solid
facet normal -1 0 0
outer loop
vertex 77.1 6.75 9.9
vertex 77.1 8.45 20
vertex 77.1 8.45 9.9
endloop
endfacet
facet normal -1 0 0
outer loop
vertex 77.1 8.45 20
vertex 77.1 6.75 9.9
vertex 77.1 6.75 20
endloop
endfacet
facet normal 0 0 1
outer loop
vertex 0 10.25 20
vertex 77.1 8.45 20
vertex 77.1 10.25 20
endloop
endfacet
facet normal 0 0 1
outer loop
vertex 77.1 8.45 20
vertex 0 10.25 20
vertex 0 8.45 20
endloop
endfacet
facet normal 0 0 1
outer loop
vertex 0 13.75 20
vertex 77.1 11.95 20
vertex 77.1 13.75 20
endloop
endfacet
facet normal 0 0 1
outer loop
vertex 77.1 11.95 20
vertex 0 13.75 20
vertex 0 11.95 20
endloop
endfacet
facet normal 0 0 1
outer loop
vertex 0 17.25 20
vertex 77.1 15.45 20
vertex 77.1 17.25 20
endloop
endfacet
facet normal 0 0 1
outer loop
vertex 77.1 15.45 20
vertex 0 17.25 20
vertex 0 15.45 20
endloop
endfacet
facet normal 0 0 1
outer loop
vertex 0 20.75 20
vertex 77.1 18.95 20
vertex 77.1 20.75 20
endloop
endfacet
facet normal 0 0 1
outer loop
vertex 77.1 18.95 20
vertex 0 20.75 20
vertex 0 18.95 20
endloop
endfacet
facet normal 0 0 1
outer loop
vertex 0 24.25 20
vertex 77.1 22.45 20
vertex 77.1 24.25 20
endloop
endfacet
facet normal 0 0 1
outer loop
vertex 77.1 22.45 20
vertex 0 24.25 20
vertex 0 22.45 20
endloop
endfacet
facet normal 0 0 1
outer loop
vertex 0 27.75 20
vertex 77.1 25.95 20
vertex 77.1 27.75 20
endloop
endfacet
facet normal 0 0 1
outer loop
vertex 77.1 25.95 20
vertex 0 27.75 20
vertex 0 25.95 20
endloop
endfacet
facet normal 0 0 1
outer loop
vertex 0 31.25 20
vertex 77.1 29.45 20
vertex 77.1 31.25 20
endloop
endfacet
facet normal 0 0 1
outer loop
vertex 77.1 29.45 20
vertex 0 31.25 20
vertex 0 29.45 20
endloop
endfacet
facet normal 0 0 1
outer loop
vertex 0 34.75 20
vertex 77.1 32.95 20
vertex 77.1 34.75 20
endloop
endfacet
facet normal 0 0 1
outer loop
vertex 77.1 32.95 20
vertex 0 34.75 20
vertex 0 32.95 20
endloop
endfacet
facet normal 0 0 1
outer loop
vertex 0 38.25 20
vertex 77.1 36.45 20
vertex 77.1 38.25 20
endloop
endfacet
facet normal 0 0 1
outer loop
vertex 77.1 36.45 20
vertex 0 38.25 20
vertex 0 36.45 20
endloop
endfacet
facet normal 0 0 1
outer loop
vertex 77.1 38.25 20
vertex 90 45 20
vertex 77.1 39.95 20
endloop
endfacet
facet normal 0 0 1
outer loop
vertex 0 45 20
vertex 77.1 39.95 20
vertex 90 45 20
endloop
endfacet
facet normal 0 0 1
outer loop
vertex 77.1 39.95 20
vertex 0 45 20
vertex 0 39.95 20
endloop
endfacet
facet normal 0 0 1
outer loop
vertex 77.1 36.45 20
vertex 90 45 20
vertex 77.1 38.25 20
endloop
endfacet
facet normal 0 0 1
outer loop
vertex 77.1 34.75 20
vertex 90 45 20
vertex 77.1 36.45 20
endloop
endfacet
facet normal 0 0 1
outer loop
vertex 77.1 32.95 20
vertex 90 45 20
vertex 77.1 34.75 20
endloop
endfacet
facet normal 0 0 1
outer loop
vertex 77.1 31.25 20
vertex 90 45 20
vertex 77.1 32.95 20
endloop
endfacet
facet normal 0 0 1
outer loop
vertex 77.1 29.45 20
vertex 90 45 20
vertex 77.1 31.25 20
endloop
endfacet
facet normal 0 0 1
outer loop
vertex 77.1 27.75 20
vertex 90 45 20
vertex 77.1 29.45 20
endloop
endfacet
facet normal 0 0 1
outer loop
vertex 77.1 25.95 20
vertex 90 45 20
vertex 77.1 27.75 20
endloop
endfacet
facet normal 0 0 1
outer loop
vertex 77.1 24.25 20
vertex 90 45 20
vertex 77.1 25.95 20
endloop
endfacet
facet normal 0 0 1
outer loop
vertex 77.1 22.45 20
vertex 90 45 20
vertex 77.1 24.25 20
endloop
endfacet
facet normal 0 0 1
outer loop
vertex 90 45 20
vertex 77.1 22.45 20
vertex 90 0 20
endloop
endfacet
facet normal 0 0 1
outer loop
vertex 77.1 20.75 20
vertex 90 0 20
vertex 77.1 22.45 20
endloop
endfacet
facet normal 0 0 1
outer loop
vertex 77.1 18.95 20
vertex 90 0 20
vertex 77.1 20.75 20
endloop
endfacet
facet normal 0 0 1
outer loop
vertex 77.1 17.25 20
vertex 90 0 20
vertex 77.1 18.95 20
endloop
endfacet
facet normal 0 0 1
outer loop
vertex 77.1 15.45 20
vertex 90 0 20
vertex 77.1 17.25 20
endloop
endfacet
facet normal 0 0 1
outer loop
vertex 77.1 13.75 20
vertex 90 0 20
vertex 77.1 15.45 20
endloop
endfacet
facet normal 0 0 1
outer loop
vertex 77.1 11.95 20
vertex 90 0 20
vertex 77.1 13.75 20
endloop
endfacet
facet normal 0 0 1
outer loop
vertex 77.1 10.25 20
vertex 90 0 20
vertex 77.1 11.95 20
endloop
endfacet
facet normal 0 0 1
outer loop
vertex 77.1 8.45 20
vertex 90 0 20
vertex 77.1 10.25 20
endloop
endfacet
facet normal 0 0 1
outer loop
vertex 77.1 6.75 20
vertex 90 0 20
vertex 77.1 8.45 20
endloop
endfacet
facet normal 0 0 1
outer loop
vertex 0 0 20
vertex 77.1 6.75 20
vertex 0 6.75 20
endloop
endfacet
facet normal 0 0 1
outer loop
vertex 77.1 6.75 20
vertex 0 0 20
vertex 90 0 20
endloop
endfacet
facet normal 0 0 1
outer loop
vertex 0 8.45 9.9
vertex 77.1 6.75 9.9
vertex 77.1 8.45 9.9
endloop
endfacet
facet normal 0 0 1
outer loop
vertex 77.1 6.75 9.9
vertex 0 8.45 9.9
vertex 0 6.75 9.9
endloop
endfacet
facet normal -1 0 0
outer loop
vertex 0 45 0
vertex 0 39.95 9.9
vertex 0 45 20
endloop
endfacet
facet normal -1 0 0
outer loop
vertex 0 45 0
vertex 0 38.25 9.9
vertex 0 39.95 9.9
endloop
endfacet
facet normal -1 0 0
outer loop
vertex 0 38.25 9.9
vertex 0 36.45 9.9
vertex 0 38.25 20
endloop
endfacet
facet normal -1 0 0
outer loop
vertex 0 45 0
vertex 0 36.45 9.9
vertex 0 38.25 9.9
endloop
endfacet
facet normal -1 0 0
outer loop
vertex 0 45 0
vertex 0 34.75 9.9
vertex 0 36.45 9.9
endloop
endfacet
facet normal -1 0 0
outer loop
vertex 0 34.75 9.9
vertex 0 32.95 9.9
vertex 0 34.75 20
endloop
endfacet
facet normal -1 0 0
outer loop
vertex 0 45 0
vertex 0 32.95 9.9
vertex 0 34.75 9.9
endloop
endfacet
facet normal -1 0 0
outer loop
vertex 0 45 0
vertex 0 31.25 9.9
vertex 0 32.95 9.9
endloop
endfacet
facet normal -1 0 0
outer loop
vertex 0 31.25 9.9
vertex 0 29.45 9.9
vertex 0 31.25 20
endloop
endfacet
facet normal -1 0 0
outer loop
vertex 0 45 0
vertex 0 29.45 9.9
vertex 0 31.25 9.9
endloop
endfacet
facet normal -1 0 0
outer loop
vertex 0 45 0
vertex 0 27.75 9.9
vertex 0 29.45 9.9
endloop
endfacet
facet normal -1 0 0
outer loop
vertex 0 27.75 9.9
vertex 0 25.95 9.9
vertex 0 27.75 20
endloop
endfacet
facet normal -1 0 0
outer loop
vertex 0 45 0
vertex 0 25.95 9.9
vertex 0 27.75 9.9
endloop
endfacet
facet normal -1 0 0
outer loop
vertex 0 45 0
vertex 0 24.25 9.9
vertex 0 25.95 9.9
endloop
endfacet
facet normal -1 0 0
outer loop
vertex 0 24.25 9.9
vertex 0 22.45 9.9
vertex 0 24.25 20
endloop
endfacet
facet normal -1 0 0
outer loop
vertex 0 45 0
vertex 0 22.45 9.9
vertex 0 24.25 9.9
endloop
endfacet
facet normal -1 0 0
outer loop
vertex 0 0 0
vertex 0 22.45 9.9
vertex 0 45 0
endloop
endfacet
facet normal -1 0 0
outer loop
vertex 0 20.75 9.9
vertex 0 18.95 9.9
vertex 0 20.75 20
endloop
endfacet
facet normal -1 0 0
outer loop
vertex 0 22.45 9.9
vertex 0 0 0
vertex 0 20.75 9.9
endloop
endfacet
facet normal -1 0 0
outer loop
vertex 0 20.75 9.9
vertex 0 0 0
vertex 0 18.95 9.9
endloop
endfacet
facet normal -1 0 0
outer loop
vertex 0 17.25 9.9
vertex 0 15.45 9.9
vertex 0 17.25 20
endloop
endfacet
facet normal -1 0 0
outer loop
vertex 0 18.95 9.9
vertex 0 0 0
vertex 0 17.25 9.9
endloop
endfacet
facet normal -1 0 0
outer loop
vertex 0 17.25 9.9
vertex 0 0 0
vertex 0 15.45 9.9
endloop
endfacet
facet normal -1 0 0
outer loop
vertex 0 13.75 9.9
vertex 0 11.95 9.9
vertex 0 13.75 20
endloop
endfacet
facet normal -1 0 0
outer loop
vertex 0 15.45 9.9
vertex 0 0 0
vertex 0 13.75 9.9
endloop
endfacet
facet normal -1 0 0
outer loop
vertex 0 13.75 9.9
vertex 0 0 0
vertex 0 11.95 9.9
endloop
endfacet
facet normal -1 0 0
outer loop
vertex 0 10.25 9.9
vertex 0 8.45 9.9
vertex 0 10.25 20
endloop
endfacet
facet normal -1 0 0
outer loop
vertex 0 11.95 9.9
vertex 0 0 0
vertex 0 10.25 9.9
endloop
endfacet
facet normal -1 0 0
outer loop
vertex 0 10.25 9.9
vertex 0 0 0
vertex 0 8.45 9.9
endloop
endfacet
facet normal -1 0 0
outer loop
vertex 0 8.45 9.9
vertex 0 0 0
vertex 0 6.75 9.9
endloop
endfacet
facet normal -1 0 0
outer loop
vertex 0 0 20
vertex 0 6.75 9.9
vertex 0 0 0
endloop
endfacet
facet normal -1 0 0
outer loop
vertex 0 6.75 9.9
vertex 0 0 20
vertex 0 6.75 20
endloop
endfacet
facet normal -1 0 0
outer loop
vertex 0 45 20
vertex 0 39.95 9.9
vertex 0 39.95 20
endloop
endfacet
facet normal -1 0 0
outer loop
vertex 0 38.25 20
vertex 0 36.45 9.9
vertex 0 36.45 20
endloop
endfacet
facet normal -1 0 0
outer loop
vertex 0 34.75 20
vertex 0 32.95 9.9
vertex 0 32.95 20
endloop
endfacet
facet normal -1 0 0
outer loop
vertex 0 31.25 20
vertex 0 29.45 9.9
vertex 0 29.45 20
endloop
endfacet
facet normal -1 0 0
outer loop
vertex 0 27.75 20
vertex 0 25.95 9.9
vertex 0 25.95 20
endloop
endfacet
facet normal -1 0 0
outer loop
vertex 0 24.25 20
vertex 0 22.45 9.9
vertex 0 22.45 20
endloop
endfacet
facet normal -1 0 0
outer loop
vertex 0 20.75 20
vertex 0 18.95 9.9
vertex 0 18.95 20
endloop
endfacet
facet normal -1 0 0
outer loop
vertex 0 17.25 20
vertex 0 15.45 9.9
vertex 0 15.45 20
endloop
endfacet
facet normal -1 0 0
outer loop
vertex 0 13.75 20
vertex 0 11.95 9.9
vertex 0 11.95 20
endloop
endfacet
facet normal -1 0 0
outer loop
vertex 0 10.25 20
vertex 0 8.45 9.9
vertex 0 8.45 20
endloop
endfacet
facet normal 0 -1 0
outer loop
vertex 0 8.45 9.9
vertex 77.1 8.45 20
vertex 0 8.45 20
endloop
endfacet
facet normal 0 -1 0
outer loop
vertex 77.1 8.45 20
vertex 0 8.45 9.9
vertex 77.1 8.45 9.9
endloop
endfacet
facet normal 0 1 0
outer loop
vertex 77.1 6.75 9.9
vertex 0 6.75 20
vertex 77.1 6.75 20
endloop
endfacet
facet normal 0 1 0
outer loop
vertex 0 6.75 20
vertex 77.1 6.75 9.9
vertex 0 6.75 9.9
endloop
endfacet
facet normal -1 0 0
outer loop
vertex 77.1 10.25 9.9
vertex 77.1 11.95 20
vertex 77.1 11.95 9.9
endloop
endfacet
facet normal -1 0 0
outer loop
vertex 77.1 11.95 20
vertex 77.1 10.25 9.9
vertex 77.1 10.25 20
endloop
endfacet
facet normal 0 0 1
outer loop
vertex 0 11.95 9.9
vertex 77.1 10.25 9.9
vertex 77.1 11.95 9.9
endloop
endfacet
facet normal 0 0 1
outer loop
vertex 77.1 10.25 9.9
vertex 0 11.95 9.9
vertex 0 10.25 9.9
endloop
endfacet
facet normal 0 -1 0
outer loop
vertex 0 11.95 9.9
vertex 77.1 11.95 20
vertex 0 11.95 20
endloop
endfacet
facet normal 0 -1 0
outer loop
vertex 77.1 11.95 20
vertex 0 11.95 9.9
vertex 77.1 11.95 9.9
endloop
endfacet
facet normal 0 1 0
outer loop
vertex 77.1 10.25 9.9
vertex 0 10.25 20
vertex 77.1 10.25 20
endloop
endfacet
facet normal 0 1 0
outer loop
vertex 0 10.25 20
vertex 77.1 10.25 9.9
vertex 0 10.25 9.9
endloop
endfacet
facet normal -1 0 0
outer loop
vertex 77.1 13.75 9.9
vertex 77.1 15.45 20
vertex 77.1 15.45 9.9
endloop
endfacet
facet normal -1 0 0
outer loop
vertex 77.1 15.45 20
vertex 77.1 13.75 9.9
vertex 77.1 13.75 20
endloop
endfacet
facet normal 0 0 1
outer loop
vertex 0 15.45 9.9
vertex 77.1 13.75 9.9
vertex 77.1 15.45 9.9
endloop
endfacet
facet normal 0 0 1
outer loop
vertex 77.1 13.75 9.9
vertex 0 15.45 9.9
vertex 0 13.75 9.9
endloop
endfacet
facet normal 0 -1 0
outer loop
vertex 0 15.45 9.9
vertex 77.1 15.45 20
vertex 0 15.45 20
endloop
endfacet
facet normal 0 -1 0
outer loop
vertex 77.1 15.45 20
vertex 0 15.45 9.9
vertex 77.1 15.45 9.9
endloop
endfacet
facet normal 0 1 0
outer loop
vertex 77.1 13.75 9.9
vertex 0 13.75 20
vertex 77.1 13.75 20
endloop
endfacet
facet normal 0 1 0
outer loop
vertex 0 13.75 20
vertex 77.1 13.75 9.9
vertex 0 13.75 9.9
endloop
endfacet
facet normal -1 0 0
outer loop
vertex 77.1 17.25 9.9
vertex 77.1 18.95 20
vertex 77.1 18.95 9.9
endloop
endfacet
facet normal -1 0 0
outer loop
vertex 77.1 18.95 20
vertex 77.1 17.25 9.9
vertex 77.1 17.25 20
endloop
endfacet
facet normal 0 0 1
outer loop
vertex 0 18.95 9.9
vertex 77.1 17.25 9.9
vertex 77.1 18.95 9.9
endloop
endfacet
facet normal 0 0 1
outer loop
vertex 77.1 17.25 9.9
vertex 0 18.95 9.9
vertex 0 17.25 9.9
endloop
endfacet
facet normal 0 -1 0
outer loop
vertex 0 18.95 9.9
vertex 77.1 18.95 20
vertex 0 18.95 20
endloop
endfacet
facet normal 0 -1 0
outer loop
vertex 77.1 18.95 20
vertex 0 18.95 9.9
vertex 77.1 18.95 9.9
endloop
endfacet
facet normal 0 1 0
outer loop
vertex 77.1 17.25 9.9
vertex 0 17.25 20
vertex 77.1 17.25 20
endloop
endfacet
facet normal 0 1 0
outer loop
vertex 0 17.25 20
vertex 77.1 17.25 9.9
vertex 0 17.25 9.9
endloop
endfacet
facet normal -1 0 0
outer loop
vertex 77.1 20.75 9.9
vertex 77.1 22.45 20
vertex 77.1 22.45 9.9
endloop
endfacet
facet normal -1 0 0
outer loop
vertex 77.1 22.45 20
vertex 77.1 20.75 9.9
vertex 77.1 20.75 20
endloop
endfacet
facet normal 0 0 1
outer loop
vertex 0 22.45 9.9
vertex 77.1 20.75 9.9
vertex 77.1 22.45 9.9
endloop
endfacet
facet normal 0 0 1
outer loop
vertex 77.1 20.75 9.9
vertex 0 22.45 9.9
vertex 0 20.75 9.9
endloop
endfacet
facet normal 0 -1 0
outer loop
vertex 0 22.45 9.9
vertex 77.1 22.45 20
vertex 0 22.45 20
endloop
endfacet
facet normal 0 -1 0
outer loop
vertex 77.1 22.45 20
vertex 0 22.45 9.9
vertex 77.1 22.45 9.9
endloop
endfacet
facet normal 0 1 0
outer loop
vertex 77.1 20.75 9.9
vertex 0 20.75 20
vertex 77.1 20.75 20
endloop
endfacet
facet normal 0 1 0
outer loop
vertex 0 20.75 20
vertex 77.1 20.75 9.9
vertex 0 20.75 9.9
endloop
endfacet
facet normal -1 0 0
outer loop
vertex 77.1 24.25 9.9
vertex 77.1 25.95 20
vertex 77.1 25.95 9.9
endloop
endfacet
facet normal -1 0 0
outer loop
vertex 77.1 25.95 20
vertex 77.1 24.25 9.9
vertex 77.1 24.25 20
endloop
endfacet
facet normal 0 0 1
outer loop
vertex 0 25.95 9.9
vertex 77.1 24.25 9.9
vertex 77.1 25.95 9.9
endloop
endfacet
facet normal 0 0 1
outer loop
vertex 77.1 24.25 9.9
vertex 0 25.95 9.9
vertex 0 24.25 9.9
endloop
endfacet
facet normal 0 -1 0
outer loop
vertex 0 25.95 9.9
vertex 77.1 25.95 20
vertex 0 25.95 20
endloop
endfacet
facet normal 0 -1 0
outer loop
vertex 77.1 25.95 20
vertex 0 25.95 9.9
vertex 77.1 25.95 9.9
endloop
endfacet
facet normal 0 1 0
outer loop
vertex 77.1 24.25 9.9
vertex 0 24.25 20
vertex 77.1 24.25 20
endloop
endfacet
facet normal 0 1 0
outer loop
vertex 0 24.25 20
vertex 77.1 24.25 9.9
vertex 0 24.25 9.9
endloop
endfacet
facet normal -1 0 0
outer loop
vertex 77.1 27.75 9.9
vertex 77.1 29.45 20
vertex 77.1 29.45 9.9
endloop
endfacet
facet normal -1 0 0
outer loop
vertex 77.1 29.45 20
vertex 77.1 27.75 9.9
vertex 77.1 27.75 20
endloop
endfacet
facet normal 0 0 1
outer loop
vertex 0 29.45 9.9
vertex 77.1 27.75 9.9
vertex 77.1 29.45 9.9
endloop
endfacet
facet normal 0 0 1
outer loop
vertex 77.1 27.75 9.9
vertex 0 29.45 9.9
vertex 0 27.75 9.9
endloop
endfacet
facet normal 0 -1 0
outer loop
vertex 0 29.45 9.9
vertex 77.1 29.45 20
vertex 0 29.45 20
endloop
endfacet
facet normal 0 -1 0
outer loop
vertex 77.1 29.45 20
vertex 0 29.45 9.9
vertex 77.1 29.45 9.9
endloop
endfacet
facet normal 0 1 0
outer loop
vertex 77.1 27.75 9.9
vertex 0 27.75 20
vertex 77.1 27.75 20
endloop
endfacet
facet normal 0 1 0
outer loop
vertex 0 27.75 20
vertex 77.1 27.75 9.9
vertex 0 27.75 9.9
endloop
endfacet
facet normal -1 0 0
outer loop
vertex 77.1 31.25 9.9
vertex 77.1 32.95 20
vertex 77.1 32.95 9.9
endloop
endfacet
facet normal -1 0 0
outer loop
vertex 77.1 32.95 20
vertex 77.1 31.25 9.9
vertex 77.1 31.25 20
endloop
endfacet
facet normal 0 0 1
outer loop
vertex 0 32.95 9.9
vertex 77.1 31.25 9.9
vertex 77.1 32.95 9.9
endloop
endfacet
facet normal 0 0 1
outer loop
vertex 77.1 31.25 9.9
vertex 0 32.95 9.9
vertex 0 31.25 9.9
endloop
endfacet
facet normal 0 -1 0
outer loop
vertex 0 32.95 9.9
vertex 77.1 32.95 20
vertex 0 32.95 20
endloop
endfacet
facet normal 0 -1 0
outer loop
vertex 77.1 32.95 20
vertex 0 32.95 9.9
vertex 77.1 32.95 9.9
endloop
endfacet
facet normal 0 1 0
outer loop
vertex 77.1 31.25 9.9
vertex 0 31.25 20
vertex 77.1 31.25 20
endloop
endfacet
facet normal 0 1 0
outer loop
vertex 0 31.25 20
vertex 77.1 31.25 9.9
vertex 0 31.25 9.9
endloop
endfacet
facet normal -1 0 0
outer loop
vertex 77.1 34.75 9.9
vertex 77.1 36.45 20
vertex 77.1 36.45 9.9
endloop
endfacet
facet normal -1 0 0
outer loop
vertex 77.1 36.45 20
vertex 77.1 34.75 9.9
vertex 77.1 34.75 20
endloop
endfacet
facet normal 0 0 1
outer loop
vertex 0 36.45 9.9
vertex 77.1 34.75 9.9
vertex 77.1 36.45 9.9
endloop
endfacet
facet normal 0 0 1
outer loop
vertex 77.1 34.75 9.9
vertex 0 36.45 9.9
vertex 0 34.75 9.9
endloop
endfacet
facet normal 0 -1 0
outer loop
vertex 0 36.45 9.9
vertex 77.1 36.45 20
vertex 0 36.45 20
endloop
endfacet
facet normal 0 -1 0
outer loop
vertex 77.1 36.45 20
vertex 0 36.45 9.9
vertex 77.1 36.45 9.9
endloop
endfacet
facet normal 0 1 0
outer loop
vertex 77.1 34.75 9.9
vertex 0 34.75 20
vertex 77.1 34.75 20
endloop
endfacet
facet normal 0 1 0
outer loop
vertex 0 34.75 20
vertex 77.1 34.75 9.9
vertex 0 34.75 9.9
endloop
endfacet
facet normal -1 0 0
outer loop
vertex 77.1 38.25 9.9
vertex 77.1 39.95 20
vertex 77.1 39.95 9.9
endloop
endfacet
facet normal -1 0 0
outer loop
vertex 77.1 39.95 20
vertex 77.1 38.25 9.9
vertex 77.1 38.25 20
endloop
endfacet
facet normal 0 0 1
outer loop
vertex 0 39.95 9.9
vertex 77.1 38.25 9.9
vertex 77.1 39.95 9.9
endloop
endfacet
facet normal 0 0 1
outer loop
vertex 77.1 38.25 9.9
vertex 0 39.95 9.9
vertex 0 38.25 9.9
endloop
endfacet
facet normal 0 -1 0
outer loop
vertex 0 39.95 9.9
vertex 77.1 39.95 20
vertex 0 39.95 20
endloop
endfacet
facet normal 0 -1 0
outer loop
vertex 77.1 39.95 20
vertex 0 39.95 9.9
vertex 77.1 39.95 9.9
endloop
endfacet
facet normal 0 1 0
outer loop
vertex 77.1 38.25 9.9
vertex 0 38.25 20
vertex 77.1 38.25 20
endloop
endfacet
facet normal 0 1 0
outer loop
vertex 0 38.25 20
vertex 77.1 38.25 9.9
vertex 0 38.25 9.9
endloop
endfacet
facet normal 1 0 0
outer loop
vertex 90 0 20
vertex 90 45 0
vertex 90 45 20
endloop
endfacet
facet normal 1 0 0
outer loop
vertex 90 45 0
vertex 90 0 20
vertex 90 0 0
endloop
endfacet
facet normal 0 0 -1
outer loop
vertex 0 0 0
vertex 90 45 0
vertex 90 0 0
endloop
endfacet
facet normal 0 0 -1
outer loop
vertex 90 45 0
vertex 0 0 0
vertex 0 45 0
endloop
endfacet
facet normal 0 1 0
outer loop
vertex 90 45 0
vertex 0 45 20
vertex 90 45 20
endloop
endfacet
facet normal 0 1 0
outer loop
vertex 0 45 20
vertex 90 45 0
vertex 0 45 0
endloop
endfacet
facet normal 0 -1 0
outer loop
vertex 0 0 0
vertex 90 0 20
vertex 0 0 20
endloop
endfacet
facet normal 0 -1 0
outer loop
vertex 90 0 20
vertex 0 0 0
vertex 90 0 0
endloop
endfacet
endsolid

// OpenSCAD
// Drying Rack for 10 Microscope Slides
// Base: 90mm (X) x 45mm (Y) x 20mm (Z)
// Slots: 10 parallel slots along X, 77mm long, 1.6mm wide, 10mm deep
// Spacing: 3.5mm centre-to-centre (Y), centred on block in X and Y

$fn = 128;

// --- Dimensions ---
// Base dimensions
base_length = 90;   // X
base_width = 45;    // Y
base_height = 20;   // Z

// Slide dimensions (for reference)
slide_length = 75;  // X
slide_width = 25;   // Y
slide_thickness = 1; // Z

// Slot dimensions
slot_length = 77;   // X
slot_width = 1.6;   // Y
slot_depth = 10;    // Z

// Layout
num_slots = 10;
slot_spacing = 3.5; // Centre-to-centre in Y

// --- Calculations ---
// Calculate the Y position of the first slot centre to ensure the group is centred.
// The span from the first slot centre to the last slot centre is (num_slots - 1) * slot_spacing.
// To centre this span on the block width:
// First Slot Y = (Block Width / 2) - (Span / 2)
span_length = (num_slots - 1) * slot_spacing;
first_slot_y = (base_width / 2) - (span_length / 2);

// --- Build ---

difference() {
    // 1. Main block
    cube([base_length, base_width, base_height], center = false);
    
    // 2. Cut the 10 slots
    // Slots run along X. We cut a long thin rectangle from the top face downwards.
    for (i = [0 : num_slots - 1]) {
        // Calculate Y position for current slot
        current_slot_y = first_slot_y + (i * slot_spacing);
        
        // Define the cutting shape
        // The slot is 77mm long (X), 1.6mm wide (Y), 10mm deep (Z).
        // Rule 5: Extend slightly past the faces to ensure clean cuts.
        cut_length = slot_length + 0.1; 
        cut_width = slot_width + 0.1;
        cut_depth = slot_depth + 0.1;
        
        // Position the cutter
        // X: Centered on the block (0)
        // Y: current_slot_y
        // Z: Top of block is at base_height, we cut down to base_height - slot_depth
        // So the cutter top is at base_height, bottom at base_height - cut_depth
        translate([0, current_slot_y, base_height - cut_depth]) {
            cube([cut_length, cut_width, cut_depth]);
        }
    }
}
